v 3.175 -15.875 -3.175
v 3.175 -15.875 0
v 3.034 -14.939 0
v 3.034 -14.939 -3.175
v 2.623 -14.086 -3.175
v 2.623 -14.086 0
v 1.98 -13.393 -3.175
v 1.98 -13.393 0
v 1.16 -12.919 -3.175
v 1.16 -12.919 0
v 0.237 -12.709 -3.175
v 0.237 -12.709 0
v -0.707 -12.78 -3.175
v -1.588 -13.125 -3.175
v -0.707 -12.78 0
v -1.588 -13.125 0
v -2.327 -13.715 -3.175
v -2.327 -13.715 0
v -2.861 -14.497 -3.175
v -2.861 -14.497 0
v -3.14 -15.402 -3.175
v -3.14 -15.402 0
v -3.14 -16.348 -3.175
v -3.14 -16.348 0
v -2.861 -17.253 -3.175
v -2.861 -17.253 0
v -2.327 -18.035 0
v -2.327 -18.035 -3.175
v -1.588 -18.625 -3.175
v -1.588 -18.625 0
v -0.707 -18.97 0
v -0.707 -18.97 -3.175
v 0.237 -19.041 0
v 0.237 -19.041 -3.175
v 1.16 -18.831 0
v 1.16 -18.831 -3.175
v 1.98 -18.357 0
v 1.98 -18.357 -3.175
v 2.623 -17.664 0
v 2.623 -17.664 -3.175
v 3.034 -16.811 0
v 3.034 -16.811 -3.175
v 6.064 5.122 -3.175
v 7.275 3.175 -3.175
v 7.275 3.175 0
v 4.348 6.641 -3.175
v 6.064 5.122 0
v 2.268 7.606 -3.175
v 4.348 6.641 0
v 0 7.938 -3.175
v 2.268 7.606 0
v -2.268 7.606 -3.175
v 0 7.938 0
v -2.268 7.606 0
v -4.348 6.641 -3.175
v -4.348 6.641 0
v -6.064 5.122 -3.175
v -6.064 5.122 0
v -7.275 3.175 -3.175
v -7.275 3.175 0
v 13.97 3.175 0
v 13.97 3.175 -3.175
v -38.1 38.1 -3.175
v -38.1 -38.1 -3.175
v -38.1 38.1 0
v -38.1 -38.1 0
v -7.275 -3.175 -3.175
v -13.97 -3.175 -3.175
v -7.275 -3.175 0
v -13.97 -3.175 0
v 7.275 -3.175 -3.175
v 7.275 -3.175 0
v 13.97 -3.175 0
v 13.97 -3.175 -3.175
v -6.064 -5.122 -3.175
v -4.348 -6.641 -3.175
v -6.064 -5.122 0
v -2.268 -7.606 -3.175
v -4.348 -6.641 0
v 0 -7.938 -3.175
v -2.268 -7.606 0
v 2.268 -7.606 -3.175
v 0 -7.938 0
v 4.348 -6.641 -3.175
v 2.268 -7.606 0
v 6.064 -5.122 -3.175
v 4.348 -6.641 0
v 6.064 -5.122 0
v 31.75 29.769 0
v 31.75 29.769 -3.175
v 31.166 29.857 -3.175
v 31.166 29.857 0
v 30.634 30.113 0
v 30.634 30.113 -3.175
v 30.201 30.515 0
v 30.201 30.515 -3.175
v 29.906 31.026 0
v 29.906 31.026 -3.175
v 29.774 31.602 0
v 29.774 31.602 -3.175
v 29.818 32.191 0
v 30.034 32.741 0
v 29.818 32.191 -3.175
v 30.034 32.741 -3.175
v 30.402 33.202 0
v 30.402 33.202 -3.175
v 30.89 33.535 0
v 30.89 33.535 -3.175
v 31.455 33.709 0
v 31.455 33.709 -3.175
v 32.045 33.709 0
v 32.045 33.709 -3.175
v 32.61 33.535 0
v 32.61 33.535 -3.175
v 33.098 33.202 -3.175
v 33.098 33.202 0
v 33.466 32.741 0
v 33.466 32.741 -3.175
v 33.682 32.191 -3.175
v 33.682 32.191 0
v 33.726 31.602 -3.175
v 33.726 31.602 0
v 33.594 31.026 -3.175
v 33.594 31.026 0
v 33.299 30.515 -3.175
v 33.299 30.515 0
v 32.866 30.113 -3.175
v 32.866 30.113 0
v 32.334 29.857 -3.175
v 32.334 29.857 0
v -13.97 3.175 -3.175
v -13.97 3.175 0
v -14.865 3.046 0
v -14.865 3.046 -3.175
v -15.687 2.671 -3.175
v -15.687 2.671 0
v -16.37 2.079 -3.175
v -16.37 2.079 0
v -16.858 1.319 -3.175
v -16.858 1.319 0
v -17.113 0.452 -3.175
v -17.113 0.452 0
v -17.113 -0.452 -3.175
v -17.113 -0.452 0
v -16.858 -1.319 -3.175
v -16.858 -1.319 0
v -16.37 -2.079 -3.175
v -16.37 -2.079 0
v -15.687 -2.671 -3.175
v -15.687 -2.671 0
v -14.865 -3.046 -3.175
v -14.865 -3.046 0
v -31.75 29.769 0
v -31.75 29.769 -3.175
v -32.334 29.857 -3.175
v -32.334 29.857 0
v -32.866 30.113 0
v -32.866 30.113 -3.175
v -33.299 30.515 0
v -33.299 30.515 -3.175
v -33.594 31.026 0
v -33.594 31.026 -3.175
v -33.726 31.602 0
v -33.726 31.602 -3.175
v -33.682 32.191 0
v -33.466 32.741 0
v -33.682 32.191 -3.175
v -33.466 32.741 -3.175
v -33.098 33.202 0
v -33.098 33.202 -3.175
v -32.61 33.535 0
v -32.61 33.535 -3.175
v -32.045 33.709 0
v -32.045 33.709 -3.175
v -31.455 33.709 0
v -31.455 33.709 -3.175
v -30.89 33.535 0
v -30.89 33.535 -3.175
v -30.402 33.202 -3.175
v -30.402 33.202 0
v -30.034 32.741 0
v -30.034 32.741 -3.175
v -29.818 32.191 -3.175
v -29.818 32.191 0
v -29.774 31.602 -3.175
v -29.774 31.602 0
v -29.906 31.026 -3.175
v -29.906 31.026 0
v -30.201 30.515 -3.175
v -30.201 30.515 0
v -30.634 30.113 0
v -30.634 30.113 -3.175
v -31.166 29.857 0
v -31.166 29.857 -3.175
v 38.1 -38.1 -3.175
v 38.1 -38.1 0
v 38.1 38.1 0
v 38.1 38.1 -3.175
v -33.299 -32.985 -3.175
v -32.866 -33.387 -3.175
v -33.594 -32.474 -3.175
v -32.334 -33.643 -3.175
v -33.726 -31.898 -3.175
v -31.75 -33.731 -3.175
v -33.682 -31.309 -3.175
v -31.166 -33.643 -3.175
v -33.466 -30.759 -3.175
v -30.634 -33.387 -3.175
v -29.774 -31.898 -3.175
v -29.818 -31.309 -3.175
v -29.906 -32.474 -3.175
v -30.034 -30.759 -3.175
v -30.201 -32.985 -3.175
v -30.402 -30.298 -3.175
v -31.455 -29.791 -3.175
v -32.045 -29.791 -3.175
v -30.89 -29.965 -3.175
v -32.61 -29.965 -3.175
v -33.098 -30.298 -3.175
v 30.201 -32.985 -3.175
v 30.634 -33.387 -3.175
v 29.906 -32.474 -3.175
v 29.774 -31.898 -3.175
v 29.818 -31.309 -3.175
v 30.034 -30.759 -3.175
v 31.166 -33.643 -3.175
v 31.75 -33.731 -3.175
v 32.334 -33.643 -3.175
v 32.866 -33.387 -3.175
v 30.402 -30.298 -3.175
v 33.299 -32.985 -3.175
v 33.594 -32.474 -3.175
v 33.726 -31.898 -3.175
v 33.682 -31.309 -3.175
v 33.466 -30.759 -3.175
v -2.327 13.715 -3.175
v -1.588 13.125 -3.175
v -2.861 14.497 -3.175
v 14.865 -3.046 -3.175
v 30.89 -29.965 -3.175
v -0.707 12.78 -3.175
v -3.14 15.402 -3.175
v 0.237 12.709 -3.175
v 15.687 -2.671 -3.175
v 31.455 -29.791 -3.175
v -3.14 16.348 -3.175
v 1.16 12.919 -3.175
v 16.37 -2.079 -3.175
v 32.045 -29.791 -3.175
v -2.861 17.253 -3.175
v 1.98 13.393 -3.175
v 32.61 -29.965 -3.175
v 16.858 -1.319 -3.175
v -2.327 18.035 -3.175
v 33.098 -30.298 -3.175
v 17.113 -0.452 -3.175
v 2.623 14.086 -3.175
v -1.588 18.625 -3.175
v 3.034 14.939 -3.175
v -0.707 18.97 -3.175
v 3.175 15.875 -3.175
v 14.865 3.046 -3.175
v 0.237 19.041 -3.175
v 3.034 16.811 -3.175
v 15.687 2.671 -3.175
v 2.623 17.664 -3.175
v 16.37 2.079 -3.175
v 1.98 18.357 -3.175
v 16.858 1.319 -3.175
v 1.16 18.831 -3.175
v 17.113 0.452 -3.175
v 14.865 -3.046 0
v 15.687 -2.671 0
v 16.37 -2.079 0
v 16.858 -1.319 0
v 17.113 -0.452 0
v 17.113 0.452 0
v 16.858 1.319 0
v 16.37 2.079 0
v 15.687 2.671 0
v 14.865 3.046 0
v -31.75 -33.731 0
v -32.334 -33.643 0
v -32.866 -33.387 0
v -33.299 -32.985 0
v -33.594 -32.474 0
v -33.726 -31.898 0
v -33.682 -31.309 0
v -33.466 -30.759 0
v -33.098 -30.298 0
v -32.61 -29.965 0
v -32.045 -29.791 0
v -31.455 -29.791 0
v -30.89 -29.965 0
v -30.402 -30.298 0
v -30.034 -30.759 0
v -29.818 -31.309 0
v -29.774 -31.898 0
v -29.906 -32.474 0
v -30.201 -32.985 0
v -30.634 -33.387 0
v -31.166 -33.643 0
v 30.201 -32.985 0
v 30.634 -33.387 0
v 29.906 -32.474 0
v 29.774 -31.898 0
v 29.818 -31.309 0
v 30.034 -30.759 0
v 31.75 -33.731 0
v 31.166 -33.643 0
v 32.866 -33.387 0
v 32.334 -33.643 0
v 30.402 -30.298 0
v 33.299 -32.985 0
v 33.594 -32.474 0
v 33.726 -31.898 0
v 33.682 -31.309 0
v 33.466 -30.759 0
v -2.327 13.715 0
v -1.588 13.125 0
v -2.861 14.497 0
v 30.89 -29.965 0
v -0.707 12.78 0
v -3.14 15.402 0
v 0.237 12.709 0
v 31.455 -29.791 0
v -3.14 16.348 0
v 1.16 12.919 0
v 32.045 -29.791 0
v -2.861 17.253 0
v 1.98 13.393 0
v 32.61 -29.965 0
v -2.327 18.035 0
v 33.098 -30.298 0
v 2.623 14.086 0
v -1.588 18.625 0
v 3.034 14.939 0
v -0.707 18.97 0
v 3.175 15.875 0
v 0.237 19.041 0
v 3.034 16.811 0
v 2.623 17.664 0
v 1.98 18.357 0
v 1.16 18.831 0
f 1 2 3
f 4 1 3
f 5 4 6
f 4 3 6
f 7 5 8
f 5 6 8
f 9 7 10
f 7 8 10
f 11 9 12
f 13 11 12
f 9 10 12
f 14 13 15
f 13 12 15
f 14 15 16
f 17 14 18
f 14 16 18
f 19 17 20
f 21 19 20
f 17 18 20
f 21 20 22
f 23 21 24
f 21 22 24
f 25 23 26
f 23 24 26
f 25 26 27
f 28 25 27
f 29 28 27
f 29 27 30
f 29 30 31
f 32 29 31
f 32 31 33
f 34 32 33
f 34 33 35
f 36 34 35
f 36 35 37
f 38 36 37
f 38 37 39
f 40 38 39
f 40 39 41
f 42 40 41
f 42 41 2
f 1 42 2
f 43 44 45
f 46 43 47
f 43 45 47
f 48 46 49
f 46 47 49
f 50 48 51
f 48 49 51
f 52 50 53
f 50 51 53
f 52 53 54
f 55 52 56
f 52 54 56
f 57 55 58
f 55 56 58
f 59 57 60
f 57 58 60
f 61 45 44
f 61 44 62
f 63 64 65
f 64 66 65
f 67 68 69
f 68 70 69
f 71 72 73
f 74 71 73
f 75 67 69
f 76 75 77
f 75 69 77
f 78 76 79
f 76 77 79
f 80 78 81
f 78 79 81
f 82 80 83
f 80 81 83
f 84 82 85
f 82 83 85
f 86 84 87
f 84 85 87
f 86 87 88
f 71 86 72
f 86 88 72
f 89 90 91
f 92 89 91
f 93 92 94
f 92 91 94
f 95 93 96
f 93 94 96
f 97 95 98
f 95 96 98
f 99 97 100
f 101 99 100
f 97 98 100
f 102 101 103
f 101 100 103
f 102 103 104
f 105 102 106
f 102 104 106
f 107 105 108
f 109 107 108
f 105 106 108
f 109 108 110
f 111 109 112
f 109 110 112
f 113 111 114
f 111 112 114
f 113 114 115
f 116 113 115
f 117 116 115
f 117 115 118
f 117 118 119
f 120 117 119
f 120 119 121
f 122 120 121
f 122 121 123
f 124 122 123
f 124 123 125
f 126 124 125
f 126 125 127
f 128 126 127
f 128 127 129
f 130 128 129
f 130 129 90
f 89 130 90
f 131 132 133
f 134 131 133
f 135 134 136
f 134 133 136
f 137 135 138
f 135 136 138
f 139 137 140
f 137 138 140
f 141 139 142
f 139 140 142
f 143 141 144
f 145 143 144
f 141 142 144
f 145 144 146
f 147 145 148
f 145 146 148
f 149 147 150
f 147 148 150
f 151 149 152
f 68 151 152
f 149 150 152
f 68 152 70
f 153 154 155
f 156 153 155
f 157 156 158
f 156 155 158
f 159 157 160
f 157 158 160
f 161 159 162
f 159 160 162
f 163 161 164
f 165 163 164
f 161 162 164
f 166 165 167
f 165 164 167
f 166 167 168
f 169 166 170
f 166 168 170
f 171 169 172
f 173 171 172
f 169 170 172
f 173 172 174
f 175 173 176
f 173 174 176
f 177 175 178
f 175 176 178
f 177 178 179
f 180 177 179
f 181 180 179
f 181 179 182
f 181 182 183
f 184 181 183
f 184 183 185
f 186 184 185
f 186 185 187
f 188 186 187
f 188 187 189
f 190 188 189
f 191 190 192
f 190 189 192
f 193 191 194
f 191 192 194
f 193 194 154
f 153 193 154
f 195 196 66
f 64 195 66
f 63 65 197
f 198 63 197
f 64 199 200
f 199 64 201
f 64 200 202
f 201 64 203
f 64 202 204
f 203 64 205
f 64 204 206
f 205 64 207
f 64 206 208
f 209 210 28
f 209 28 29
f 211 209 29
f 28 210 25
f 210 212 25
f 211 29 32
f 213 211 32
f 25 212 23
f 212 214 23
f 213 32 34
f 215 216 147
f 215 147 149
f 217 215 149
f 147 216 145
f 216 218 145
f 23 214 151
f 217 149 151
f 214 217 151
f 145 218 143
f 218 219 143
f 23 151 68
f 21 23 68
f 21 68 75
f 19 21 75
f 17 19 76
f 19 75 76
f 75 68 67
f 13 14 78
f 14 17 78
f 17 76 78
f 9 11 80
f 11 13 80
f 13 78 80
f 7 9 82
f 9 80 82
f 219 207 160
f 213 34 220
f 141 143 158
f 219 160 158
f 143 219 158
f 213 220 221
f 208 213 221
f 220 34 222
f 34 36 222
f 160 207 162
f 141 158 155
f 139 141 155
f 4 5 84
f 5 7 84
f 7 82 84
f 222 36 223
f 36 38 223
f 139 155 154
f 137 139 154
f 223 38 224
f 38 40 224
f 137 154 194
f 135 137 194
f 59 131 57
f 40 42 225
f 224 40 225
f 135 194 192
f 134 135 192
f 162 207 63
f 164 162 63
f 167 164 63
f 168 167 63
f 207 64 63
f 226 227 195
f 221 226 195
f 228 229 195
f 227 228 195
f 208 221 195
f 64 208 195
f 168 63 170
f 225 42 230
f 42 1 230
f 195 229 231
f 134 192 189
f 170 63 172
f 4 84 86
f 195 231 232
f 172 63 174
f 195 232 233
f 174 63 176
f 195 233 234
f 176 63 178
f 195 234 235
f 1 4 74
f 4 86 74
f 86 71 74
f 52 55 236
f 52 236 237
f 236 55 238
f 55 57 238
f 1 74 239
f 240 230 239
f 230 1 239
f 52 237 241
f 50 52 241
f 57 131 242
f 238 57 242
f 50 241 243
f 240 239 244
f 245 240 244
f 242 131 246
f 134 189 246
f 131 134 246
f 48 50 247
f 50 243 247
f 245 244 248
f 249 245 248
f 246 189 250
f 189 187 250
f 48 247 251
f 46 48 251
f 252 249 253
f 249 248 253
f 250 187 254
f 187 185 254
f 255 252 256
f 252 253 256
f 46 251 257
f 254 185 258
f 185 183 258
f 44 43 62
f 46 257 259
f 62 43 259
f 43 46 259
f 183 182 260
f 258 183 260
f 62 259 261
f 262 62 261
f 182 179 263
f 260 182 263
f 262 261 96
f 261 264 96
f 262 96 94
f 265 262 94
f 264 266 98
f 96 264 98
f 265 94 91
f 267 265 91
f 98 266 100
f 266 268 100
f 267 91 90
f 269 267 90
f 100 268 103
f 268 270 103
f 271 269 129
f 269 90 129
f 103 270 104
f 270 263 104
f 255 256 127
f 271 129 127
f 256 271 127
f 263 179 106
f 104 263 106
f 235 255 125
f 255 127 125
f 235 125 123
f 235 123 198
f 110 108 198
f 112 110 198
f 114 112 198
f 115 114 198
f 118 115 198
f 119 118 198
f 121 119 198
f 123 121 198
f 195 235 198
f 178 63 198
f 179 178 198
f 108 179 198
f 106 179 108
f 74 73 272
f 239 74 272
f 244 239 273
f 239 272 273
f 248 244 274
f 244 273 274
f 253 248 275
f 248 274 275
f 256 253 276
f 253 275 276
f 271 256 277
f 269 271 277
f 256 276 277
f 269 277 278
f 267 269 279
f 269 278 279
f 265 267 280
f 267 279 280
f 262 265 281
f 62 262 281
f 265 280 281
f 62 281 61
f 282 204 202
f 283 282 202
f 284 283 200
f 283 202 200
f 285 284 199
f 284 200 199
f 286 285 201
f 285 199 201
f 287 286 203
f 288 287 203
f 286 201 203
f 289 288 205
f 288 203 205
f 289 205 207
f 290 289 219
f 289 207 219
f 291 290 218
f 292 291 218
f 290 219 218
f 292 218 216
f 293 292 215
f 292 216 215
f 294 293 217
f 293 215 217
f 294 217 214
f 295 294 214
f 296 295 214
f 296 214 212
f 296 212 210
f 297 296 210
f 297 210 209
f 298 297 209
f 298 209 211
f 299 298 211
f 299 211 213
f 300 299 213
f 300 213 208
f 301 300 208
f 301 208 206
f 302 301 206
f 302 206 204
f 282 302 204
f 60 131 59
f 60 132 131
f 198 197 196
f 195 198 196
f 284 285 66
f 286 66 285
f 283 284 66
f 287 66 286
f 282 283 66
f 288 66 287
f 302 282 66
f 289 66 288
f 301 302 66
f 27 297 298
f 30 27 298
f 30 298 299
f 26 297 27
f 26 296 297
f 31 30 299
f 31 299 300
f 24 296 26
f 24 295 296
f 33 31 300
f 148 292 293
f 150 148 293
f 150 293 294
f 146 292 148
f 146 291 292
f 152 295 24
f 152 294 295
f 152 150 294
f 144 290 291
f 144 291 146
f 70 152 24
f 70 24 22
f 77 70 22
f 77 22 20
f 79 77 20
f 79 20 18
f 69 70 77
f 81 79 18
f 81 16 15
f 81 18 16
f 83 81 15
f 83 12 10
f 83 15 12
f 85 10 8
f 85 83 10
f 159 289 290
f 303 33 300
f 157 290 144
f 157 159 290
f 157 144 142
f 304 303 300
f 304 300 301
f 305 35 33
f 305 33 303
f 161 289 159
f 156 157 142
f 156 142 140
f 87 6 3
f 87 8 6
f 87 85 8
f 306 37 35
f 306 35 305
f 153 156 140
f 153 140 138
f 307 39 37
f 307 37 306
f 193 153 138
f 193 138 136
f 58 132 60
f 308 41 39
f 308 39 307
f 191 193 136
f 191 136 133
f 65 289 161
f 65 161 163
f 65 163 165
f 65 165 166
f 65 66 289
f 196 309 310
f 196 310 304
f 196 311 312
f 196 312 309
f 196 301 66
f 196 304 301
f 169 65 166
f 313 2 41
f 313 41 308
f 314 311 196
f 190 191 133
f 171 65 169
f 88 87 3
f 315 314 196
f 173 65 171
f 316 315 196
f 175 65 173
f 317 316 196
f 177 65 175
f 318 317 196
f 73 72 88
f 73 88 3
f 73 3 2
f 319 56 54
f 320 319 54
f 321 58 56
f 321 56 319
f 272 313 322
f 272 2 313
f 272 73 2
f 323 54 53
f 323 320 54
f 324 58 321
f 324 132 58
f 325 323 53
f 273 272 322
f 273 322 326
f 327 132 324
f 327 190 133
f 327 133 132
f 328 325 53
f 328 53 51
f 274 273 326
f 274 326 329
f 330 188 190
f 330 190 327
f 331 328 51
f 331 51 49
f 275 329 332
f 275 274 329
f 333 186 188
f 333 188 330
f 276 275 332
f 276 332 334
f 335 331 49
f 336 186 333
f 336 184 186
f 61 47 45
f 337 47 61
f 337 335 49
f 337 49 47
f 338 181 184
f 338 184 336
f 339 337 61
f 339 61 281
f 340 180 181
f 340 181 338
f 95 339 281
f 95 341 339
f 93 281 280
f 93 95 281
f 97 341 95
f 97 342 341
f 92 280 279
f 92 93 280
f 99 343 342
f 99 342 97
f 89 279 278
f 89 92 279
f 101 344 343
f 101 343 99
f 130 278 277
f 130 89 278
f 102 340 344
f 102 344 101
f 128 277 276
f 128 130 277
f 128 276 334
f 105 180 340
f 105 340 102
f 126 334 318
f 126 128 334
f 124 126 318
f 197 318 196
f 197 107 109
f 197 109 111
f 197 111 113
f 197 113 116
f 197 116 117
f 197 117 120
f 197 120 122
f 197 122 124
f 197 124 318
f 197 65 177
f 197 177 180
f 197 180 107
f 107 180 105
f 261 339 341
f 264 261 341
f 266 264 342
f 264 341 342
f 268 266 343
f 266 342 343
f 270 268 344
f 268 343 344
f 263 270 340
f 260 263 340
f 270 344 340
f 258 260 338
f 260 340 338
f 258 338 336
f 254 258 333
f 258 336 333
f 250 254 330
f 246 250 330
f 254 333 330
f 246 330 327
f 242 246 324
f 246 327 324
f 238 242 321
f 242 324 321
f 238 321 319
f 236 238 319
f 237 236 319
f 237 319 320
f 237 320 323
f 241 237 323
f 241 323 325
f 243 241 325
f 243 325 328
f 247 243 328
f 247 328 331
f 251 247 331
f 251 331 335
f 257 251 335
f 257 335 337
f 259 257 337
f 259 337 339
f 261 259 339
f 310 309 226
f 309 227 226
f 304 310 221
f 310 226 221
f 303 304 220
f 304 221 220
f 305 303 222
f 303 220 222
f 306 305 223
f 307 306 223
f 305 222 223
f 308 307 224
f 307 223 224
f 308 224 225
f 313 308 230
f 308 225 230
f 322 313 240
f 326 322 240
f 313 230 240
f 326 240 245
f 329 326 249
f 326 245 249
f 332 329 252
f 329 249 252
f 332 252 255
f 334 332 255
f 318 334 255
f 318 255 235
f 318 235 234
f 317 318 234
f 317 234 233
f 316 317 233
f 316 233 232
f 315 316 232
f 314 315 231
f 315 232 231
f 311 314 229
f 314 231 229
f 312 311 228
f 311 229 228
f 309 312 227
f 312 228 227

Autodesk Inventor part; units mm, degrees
ref_plane "YZ Plane" through (0, 0, 0) normal (1, 0, 0) x (0, 1, 0)
ref_plane "XZ Plane" through (0, 0, 0) normal (0, 1, 0) x (-1, 0, 0)
ref_plane "XY Plane" through (0, 0, 0) normal (0, 0, 1) x (1, 0, 0)
sketch "Sketch1" plane through (0, 0, 0) normal (0, 0, 1) x (1, 0, 0)
  line L0 (-38.1, 38.1) -> (38.1, 38.1)
  line L1 (38.1, 38.1) -> (38.1, -38.1)
  line L2 (38.1, -38.1) -> (-38.1, -38.1)
  line L3 (-38.1, -38.1) -> (-38.1, 38.1)
  circle A0 centre (0, 0) radius 7.9375
  line L4 (38.1, 38.1) -> (50.8, 38.1)
  line L5 (50.8, 38.1) -> (50.8, -38.1)
  line L6 (50.8, -38.1) -> (38.1, -38.1)
  line L7 (38.1, -38.1) -> (38.1, 38.1)
  line L8 (-38.1, 38.1) -> (-50.8, 38.1)
  line L9 (-50.8, 38.1) -> (-50.8, -38.1)
  line L10 (-50.8, -38.1) -> (-38.1, -38.1)
  line L11 (-38.1, -38.1) -> (-38.1, 38.1)
  arc A1 (-13.97, 3.175) -> (-13.97, -3.175) centre (-13.97, 0) ccw
  arc A2 (13.97, -3.175) -> (17.145, 0) centre (13.97, 0) ccw
  line L12 (-13.97, 3.175) -> (13.97, 3.175)
  arc A3 (17.145, 0) -> (13.97, 3.175) centre (13.97, 0) ccw
  line L13 (-13.97, -3.175) -> (13.97, -3.175)
  circle A4 centre (0, 15.875) radius 3.175
  circle A5 centre (0, -15.875) radius 3.175
  point P0 (-31.75, 31.75)
  point P1 (31.75, 31.75)
  point P2 (31.75, -31.75)
  point P3 (-31.75, -31.75)
  dimension "d0" = 76.2
  dimension "d1" = 76.2
  dimension "d2" = 38.1
  dimension "d3" = 38.1
  dimension "d4" = 15.875
  dimension "d5" = 6.35
  dimension "d6" = 6.35
  dimension "d7" = 6.35
  dimension "d8" = 6.35
  dimension "d36" = 12.7
  dimension "d37" = 12.7
  dimension "d42" = 6.35
  dimension "d43" = 27.94
  dimension "d44" = 3.175
  dimension "d45" = 13.97
  dimension "d46" = 6.35
  dimension "d47" = 6.35
  dimension "d48" = 15.875
  dimension "d49" = 31.75
extrude "Extrusion1" add sketch "Sketch1" against normal blind 3.175 contours L0 L1 L2 L3 | A0 L12 A3 A2 L13 | A0 L13 A1 L12 | A4 | A5
hole "Hole1" at (-31.75, 31.75, 0) at (31.75, 31.75, 0) at (31.75, -31.75, 0) at (-31.75, -31.75, 0) direction (0, 0, -1) diameter 3.9624 end through all thread size "10-32 UNF" class "2B" standard "ANSI Unified Screw Threads"
extrude "Extrusion3" cut sketch "Sketch1" against normal through all contours A0 L13 L12 | A0 L12 A3 A2 L13 | A0 L13 A1 L12 | A4 | A5
thread "Thread1" size "1/4-20 UNC" class "2B" standard "ANSI Unified Screw Threads" full length
thread "Thread2" size "1/4-20 UNC" class "2B" standard "ANSI Unified Screw Threads" full length
equation "\"d2\" = 0.5 * d1"
equation "\"d3\" = 0.5 * d0"
equation "\"d7\" = d6"
equation "\"d8\" = d5"
equation "\"d45\" = 0.5 * d43"
equation "\"d48\" = 0.5 * d49"
properties part number "Slide Plate BD Motor mount"
